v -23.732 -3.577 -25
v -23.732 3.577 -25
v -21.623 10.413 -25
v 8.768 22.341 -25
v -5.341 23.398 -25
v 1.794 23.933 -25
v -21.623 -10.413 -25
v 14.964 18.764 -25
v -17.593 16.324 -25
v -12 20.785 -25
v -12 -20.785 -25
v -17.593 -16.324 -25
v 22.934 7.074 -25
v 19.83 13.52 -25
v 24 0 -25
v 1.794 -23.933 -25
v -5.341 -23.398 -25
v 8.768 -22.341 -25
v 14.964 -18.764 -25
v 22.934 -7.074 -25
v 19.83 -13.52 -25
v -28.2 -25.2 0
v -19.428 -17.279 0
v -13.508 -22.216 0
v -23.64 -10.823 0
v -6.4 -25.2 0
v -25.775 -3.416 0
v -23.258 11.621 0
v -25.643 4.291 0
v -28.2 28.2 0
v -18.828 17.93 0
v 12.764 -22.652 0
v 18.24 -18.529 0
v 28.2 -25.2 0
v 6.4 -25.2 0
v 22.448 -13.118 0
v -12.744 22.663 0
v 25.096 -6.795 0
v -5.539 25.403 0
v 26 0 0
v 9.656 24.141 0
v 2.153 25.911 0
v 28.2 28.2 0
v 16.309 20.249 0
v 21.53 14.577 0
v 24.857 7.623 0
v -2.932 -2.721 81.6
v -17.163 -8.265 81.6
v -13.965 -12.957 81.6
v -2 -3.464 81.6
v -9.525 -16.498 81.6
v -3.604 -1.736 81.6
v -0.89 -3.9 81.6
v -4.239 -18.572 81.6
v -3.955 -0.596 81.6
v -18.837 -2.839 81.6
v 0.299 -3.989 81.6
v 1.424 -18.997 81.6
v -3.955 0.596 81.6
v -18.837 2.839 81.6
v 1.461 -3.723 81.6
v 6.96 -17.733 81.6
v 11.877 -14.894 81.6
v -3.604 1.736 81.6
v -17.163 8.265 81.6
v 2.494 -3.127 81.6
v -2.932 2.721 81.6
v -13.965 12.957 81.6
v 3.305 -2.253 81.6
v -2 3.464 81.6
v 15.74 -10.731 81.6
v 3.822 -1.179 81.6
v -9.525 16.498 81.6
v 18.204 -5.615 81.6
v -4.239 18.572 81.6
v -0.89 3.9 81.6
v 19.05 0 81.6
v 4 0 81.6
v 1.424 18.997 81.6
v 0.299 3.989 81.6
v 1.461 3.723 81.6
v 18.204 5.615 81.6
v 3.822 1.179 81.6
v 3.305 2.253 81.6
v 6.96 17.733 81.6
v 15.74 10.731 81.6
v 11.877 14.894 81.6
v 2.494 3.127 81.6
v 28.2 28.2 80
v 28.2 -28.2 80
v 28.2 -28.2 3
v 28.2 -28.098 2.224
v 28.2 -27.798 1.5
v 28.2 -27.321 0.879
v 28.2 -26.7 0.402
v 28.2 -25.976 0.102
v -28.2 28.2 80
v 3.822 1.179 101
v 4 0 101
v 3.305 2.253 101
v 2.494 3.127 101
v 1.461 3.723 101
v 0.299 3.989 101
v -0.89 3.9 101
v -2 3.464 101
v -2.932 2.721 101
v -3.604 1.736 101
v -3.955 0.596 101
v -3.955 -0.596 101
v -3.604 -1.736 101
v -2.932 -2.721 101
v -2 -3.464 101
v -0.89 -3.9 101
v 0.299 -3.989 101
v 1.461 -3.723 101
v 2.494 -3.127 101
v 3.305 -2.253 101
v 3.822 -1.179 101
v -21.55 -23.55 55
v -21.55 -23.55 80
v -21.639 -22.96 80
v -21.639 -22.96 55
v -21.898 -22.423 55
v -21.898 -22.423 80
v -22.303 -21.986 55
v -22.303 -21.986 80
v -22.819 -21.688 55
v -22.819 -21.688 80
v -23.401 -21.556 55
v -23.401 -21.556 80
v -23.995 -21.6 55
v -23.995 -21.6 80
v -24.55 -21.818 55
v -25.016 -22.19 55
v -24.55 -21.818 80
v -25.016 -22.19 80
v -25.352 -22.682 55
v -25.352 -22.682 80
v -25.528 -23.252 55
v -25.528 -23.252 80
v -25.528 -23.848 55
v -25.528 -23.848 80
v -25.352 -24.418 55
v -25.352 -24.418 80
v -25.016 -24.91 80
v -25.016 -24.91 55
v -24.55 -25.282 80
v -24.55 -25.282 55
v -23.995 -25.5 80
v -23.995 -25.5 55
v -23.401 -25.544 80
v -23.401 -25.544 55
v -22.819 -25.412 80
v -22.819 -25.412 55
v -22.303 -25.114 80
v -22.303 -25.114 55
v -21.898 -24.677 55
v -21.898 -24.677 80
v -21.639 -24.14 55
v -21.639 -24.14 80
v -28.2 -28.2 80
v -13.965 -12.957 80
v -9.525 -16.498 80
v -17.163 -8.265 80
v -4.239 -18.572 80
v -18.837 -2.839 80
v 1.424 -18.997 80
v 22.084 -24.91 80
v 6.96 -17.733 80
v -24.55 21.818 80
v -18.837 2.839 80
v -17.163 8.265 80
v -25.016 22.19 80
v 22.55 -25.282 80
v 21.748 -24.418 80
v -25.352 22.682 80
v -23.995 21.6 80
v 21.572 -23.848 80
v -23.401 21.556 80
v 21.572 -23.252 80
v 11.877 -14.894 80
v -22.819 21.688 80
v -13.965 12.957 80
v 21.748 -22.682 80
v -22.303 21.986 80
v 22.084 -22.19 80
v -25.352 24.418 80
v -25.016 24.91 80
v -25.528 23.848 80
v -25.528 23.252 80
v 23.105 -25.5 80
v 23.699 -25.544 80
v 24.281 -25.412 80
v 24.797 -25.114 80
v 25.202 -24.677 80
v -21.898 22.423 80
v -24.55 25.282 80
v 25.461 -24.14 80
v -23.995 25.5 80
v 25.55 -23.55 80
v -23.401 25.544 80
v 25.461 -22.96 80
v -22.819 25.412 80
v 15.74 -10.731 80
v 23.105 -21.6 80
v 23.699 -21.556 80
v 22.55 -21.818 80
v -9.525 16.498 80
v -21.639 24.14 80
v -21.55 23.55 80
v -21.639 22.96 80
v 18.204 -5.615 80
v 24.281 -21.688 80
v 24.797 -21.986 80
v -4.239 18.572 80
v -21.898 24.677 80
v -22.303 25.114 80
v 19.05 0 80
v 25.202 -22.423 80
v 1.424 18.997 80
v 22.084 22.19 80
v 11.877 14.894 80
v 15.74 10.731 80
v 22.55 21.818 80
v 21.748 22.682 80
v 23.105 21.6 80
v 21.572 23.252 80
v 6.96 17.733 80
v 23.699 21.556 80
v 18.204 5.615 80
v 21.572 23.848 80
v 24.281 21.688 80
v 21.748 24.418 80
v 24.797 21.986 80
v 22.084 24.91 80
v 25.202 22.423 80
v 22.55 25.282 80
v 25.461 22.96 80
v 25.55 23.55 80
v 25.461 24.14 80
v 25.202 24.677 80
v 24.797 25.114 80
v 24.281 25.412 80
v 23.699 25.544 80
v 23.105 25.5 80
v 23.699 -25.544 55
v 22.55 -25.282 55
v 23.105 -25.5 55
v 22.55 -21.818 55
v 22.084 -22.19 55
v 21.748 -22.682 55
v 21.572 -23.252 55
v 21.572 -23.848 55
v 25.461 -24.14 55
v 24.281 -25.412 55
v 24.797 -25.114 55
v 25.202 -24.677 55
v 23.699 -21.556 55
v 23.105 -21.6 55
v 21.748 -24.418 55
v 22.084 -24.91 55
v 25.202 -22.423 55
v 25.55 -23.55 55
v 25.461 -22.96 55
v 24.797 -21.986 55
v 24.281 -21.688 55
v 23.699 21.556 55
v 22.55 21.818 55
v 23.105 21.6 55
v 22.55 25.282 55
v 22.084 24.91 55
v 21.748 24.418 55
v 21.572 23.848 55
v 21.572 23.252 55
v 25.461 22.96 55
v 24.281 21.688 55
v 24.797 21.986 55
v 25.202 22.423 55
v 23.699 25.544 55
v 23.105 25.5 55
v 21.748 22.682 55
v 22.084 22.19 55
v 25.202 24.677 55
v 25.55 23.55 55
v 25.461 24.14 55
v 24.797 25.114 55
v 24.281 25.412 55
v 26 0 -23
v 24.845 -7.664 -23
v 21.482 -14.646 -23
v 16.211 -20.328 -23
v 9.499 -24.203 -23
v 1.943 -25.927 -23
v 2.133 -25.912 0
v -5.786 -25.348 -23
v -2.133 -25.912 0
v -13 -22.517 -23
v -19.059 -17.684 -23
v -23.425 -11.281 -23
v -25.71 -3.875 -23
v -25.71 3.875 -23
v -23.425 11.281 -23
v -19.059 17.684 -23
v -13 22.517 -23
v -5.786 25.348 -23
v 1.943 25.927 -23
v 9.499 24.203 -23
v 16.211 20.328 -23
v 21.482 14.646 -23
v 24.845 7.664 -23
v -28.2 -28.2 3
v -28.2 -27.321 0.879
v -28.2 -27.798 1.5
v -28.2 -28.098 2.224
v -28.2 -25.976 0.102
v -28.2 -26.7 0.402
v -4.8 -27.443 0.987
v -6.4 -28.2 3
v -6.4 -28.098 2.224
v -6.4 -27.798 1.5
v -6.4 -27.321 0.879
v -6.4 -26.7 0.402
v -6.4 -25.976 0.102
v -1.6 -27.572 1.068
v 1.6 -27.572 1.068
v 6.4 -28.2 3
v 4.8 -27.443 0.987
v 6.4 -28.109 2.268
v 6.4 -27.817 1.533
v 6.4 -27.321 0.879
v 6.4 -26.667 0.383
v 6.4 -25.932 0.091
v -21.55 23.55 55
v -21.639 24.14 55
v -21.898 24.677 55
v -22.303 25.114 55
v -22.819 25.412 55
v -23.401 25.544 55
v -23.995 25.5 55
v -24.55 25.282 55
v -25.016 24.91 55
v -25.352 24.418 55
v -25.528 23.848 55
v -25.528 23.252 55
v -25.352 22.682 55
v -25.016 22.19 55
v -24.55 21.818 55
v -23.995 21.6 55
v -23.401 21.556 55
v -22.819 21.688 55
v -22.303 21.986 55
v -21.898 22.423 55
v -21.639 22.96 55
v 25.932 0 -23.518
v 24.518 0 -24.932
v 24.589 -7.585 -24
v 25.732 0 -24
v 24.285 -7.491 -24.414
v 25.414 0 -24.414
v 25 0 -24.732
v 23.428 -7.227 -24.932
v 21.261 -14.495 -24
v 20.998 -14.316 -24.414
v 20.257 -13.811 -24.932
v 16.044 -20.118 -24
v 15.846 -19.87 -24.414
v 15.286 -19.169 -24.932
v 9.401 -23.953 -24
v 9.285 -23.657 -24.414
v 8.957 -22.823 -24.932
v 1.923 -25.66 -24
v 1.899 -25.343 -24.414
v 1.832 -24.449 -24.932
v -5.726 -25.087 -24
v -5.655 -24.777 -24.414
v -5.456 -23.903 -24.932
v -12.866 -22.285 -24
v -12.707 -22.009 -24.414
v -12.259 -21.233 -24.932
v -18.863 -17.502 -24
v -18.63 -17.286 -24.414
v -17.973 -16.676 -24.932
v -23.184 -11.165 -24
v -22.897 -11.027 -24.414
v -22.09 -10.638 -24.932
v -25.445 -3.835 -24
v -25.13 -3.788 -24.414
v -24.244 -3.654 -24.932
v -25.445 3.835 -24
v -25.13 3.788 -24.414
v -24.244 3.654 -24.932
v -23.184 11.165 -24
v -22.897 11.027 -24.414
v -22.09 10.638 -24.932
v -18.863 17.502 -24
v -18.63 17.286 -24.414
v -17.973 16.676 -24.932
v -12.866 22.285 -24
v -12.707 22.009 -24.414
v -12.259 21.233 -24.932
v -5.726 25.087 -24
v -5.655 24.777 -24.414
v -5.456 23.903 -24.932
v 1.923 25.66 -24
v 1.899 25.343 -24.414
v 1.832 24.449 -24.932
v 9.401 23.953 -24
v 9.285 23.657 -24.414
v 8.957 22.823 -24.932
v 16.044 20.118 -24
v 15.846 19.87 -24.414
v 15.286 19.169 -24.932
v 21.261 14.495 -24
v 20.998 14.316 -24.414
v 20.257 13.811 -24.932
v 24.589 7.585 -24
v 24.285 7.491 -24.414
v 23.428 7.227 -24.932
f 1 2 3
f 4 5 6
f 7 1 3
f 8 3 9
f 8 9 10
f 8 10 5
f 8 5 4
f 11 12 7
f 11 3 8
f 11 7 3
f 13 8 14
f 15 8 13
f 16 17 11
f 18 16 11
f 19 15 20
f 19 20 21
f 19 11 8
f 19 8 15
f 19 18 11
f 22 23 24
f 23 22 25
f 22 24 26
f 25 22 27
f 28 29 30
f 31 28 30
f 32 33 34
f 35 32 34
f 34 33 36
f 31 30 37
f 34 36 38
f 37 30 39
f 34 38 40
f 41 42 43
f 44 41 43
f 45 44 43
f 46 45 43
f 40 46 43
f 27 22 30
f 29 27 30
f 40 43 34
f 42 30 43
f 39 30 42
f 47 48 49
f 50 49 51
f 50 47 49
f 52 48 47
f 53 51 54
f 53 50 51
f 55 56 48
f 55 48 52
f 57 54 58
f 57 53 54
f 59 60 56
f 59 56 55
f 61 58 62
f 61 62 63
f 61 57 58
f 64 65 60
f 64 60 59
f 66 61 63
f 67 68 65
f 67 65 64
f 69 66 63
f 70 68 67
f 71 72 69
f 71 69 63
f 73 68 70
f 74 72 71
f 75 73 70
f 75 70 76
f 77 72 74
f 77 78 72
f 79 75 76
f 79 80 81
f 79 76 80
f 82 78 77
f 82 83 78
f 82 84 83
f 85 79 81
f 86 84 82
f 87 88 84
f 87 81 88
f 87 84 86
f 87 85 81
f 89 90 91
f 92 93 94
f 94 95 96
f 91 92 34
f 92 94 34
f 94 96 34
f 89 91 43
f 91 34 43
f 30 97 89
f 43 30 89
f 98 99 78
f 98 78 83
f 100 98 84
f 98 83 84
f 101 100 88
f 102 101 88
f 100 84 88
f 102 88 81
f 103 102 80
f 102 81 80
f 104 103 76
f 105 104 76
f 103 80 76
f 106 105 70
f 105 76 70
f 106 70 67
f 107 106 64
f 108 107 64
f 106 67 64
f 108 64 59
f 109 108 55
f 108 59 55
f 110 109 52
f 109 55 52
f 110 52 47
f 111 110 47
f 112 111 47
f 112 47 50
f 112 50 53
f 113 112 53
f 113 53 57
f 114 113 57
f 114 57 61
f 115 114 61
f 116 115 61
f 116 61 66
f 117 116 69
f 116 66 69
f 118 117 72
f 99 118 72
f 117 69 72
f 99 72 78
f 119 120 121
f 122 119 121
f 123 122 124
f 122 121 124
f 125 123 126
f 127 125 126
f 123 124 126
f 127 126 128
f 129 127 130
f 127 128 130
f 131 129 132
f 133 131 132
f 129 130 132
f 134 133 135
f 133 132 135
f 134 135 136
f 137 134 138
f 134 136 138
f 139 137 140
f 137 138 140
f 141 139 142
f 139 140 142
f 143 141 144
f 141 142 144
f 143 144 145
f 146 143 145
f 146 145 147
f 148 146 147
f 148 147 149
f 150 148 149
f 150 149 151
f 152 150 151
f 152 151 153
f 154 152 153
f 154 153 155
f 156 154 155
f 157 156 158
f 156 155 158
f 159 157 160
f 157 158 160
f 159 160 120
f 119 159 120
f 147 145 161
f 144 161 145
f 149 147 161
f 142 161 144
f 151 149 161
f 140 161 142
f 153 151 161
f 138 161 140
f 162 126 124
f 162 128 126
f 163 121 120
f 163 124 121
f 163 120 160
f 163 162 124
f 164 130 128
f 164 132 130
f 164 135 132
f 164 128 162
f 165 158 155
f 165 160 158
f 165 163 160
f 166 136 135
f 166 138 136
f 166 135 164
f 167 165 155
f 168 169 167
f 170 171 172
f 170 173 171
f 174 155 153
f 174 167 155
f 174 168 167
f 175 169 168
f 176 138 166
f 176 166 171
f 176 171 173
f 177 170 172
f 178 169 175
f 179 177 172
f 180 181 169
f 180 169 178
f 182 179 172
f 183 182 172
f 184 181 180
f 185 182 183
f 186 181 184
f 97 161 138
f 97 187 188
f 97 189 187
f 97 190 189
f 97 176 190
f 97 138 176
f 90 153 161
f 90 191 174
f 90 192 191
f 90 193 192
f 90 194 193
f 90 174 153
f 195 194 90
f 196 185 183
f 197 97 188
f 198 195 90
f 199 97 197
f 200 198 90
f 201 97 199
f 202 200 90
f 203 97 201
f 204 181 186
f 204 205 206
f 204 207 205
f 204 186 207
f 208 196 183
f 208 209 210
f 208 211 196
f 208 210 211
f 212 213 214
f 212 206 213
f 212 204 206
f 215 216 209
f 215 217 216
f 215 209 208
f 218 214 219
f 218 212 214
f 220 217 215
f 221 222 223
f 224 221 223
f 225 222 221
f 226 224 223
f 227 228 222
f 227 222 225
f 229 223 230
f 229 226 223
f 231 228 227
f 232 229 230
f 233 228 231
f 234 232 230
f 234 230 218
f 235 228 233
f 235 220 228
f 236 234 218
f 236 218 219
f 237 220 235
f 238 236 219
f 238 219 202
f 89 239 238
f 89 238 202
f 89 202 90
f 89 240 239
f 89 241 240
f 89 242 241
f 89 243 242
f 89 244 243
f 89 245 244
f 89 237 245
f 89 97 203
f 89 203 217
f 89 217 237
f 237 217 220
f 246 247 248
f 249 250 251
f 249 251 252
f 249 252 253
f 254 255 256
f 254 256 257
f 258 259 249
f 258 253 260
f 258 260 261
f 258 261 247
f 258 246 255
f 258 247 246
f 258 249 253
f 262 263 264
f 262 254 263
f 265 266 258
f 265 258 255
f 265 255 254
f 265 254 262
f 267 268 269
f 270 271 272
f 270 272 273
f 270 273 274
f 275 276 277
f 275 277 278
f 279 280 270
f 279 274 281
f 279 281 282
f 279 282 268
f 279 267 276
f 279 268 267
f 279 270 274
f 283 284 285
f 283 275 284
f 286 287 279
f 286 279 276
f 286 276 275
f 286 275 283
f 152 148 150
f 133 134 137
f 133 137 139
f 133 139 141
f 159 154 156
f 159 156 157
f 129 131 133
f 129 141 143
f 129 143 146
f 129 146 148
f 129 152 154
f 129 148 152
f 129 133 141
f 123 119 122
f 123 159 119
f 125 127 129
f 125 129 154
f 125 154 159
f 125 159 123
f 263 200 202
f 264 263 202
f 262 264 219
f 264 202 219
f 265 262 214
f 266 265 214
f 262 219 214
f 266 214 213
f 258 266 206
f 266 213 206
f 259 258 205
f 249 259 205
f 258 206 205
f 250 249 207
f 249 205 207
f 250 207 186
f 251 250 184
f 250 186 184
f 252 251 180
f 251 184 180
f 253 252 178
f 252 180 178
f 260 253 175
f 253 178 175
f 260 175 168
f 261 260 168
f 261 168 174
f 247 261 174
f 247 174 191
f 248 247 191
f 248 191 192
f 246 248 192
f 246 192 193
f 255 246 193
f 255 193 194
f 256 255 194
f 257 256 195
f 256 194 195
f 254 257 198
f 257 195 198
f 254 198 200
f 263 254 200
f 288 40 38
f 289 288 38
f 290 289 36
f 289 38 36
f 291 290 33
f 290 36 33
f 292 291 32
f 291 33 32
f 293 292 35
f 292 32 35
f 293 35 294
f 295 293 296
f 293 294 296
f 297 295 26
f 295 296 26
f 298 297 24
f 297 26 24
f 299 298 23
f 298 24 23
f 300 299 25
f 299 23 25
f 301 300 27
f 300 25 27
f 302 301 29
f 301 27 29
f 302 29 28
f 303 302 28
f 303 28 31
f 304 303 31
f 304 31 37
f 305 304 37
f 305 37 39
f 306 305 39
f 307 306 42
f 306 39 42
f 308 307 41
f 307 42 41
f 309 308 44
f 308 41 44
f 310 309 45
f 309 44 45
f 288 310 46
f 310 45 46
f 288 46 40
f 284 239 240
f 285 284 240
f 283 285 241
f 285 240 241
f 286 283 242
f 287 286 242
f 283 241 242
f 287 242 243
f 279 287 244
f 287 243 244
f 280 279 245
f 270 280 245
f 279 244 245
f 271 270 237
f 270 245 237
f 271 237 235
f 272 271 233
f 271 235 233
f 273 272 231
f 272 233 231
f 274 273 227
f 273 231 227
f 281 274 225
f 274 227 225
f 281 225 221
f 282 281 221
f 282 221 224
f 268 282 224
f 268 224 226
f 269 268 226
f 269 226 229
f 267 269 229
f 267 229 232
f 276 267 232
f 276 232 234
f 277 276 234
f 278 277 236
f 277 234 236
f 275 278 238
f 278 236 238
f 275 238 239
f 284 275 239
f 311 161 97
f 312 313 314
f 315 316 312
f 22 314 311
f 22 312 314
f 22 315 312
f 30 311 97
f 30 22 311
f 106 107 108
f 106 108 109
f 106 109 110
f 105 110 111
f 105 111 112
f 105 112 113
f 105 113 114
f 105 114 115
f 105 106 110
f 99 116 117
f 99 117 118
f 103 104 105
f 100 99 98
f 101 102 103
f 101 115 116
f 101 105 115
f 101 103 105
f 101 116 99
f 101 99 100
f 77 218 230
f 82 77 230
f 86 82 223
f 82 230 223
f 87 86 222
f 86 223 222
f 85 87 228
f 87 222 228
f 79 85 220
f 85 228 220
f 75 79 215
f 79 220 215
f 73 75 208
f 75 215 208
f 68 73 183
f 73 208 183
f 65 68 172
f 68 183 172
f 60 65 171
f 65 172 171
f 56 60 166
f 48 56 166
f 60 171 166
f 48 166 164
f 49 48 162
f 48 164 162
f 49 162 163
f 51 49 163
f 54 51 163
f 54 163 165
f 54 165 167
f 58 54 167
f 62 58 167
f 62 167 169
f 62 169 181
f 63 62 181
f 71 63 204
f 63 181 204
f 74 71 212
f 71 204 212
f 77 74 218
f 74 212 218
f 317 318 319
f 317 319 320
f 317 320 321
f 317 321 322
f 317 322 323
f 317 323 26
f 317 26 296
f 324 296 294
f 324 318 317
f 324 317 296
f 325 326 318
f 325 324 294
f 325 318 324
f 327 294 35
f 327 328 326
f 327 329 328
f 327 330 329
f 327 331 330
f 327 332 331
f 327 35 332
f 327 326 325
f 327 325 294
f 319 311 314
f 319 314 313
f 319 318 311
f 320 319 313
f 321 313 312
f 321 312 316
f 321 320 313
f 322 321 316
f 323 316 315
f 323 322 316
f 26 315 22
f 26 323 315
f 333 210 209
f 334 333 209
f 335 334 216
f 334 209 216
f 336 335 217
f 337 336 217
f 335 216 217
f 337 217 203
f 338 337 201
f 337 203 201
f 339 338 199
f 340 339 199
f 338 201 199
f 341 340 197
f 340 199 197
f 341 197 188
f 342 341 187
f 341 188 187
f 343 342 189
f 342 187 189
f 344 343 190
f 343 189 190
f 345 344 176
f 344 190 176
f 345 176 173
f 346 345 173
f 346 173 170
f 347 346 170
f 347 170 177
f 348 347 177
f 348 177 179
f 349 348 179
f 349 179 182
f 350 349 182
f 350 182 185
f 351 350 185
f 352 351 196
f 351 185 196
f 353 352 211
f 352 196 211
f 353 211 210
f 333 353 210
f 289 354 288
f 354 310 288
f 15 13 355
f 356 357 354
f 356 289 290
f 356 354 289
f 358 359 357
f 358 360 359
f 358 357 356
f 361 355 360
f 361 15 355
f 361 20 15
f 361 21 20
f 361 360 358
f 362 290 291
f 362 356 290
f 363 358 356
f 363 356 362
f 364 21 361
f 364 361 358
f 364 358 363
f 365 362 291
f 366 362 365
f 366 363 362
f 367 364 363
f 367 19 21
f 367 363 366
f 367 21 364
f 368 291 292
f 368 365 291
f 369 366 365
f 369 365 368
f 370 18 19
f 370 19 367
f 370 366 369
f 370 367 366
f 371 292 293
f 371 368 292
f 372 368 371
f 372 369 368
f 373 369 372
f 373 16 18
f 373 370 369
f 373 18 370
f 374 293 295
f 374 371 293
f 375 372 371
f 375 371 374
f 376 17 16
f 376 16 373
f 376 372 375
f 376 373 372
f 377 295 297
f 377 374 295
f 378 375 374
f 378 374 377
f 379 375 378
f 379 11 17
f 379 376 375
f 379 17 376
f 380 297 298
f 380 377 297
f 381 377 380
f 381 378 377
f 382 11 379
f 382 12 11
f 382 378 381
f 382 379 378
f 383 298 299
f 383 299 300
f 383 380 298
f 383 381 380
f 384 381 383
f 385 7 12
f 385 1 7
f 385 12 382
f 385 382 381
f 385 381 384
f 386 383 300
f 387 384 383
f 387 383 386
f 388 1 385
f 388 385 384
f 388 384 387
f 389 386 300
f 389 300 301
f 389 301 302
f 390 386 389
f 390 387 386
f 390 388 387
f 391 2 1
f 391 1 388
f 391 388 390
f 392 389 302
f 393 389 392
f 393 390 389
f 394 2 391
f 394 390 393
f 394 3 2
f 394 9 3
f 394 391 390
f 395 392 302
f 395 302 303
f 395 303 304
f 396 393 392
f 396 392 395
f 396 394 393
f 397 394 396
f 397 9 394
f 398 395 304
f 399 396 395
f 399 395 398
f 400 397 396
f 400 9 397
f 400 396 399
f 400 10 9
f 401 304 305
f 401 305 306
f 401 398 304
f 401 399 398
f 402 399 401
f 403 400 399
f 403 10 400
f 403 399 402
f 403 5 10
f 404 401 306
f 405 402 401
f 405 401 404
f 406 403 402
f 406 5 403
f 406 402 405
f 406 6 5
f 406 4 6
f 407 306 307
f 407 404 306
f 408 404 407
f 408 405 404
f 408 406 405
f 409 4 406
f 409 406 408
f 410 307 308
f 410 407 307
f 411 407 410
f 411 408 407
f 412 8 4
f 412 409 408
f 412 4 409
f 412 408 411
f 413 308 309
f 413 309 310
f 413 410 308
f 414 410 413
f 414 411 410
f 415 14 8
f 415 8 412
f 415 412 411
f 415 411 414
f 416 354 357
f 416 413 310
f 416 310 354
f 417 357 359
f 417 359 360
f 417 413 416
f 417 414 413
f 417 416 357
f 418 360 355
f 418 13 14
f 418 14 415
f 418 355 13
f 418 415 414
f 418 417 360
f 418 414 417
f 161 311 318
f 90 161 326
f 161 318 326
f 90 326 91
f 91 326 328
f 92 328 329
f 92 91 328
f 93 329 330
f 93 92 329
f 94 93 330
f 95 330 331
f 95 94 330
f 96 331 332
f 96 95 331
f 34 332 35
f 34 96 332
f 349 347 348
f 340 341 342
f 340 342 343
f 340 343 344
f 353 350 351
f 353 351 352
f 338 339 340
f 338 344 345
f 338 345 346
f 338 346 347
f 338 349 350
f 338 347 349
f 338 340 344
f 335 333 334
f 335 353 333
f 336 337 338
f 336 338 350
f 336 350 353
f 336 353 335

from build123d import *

# Parameters (mm, degrees)
F0_W     = 56.4
F0_H     = 56.4
F1_DEPTH = 80
F2_R     = 19.05
F3_DEPTH = 1.6
F4_R     = 4
F5_DEPTH = 19.4
F6_R     = 2
F7_DEPTH = 25
F8_R     = 26
F9_DEPTH = 25
F10_R    = 3
F11_R    = 2


with BuildPart() as f1:
    # F0 (on Top) → F1 (new body)
    with BuildSketch(Plane.XY):
        Rectangle(F0_W, F0_H)
    extrude(amount=F1_DEPTH)

    # F2 (on face) → F3 (join)
    with BuildSketch(Plane.XY.offset(80)):
        Circle(F2_R)
    extrude(amount=F3_DEPTH)

    # F4 (on face) → F5 (join)
    with BuildSketch(Plane.XY.offset(81.6)):
        Circle(F4_R)
    extrude(amount=F5_DEPTH)

    # F6 (on face) → F7 (cut)
    with BuildSketch(Plane.XY.offset(80)):
        with Locations((23.55, 23.55)):
            Circle(F6_R)
        with Locations((-23.55, 23.55)):
            Circle(F6_R)
        with Locations((-23.55, -23.55)):
            Circle(F6_R)
        with Locations((23.55, -23.55)):
            Circle(F6_R)
    extrude(amount=-F7_DEPTH, mode=Mode.SUBTRACT)

    # F8 (on face) → F9 (join)
    with BuildSketch(Plane(origin=(0, 0, 0), x_dir=(1, 0, 0), z_dir=(0, 0, -1))):
        Circle(F8_R)
    extrude(amount=F9_DEPTH)

    # F10
    f10_edges = [f1.edges().sort_by_distance(p)[0] for p in [
        (0, -28.2, 0),
    ]]
    fillet(f10_edges, radius=F10_R)

    # F11
    f11_edges = [f1.edges().sort_by_distance(p)[0] for p in [
        (-26, 0, -25),
    ]]
    fillet(f11_edges, radius=F11_R)


solid = f1.part
